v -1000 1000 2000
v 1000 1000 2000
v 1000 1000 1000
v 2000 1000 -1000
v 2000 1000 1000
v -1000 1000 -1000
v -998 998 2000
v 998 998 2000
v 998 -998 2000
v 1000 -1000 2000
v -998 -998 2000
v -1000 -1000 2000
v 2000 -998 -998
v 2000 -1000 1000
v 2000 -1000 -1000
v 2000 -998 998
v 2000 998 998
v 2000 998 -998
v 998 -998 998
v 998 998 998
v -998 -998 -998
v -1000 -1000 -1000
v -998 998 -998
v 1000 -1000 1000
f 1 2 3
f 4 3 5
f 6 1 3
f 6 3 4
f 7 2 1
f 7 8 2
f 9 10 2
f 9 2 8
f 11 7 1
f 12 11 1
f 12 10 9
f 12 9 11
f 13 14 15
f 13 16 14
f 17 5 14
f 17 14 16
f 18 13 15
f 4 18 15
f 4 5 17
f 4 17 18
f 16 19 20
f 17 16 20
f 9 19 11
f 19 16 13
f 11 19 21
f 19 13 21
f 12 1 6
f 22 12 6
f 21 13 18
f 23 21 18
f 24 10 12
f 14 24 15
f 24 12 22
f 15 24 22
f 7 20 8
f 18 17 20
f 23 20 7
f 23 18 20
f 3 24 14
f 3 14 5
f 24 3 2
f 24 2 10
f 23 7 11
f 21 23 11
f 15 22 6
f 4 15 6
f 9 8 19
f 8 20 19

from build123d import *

# Parameters (mm, degrees)
EXTRUDE_THIN1_START       = -1000
EXTRUDE_THIN1_OUTLINE_W   = 2000
EXTRUDE_THIN1_OUTLINE_H   = 2000
EXTRUDE_THIN1_OUTLINE_W_2 = 1996
EXTRUDE_THIN1_OUTLINE_H_2 = 1996
EXTRUDE_THIN1_DEPTH       = 3000
EXTRUDE_THIN2_START       = -1998
SKETCH2_W                 = 2000
SKETCH2_H                 = 2000
SKETCH2_W_2               = 1996
SKETCH2_H_2               = 1996
EXTRUDE_THIN2_DEPTH       = 2998
CUT_EXTRUDE1_REACH        = 3743.657
SKETCH3_W                 = 1996
SKETCH3_H                 = 1996
CUT_EXTRUDE2_REACH        = 3743.657
SKETCH4_W                 = 1996
SKETCH4_H                 = 1996


# Read off the part's stored shape, not the designer's step: Extrude-Thin1
with BuildPart() as part:
    # Extrude-Thin1 outline → Extrude-Thin1 (new body)
    with BuildSketch(Plane(origin=(0, 0, 0), x_dir=(0, 0, -1), z_dir=(1, 0, 0)).offset(EXTRUDE_THIN1_START)):
        Rectangle(EXTRUDE_THIN1_OUTLINE_W, EXTRUDE_THIN1_OUTLINE_H)
        Rectangle(EXTRUDE_THIN1_OUTLINE_W_2, EXTRUDE_THIN1_OUTLINE_H_2, mode=Mode.SUBTRACT)
    extrude(amount=EXTRUDE_THIN1_DEPTH)

    # Sketch2 → Extrude-Thin2 (add)
    with BuildSketch(Plane(origin=(0, 0, 1000), x_dir=(-1, 0, 0), z_dir=(0, 0, 1)).offset(EXTRUDE_THIN2_START)):
        Rectangle(SKETCH2_W, SKETCH2_H)
        Rectangle(SKETCH2_W_2, SKETCH2_H_2, mode=Mode.SUBTRACT)
    extrude(amount=EXTRUDE_THIN2_DEPTH)

    # Sketch3 → Cut-Extrude1 (cut, up to next)
    with BuildSketch(Plane(origin=(0, 0, 2000), x_dir=(-1, 0, 0), z_dir=(0, 0, 1)), mode=Mode.PRIVATE) as cut_extrude1_sk1:
        Rectangle(SKETCH3_W, SKETCH3_H)
    cut_extrude1_tool1 = extrude(cut_extrude1_sk1.sketch, amount=-CUT_EXTRUDE1_REACH, mode=Mode.PRIVATE) & part.part
    add(cut_extrude1_tool1.solids().sort_by_distance((0, 0, 2000))[0], mode=Mode.SUBTRACT)

    # Sketch4 → Cut-Extrude2 (cut, up to next)
    with BuildSketch(Plane(origin=(2000, 0, 0), x_dir=(0, 0, -1), z_dir=(1, 0, 0)), mode=Mode.PRIVATE) as cut_extrude2_sk1:
        Rectangle(SKETCH4_W, SKETCH4_H)
    cut_extrude2_tool1 = extrude(cut_extrude2_sk1.sketch, amount=-CUT_EXTRUDE2_REACH, mode=Mode.PRIVATE) & part.part
    add(cut_extrude2_tool1.solids().sort_by_distance((2000, 0, 0))[0], mode=Mode.SUBTRACT)


solid = part.part
